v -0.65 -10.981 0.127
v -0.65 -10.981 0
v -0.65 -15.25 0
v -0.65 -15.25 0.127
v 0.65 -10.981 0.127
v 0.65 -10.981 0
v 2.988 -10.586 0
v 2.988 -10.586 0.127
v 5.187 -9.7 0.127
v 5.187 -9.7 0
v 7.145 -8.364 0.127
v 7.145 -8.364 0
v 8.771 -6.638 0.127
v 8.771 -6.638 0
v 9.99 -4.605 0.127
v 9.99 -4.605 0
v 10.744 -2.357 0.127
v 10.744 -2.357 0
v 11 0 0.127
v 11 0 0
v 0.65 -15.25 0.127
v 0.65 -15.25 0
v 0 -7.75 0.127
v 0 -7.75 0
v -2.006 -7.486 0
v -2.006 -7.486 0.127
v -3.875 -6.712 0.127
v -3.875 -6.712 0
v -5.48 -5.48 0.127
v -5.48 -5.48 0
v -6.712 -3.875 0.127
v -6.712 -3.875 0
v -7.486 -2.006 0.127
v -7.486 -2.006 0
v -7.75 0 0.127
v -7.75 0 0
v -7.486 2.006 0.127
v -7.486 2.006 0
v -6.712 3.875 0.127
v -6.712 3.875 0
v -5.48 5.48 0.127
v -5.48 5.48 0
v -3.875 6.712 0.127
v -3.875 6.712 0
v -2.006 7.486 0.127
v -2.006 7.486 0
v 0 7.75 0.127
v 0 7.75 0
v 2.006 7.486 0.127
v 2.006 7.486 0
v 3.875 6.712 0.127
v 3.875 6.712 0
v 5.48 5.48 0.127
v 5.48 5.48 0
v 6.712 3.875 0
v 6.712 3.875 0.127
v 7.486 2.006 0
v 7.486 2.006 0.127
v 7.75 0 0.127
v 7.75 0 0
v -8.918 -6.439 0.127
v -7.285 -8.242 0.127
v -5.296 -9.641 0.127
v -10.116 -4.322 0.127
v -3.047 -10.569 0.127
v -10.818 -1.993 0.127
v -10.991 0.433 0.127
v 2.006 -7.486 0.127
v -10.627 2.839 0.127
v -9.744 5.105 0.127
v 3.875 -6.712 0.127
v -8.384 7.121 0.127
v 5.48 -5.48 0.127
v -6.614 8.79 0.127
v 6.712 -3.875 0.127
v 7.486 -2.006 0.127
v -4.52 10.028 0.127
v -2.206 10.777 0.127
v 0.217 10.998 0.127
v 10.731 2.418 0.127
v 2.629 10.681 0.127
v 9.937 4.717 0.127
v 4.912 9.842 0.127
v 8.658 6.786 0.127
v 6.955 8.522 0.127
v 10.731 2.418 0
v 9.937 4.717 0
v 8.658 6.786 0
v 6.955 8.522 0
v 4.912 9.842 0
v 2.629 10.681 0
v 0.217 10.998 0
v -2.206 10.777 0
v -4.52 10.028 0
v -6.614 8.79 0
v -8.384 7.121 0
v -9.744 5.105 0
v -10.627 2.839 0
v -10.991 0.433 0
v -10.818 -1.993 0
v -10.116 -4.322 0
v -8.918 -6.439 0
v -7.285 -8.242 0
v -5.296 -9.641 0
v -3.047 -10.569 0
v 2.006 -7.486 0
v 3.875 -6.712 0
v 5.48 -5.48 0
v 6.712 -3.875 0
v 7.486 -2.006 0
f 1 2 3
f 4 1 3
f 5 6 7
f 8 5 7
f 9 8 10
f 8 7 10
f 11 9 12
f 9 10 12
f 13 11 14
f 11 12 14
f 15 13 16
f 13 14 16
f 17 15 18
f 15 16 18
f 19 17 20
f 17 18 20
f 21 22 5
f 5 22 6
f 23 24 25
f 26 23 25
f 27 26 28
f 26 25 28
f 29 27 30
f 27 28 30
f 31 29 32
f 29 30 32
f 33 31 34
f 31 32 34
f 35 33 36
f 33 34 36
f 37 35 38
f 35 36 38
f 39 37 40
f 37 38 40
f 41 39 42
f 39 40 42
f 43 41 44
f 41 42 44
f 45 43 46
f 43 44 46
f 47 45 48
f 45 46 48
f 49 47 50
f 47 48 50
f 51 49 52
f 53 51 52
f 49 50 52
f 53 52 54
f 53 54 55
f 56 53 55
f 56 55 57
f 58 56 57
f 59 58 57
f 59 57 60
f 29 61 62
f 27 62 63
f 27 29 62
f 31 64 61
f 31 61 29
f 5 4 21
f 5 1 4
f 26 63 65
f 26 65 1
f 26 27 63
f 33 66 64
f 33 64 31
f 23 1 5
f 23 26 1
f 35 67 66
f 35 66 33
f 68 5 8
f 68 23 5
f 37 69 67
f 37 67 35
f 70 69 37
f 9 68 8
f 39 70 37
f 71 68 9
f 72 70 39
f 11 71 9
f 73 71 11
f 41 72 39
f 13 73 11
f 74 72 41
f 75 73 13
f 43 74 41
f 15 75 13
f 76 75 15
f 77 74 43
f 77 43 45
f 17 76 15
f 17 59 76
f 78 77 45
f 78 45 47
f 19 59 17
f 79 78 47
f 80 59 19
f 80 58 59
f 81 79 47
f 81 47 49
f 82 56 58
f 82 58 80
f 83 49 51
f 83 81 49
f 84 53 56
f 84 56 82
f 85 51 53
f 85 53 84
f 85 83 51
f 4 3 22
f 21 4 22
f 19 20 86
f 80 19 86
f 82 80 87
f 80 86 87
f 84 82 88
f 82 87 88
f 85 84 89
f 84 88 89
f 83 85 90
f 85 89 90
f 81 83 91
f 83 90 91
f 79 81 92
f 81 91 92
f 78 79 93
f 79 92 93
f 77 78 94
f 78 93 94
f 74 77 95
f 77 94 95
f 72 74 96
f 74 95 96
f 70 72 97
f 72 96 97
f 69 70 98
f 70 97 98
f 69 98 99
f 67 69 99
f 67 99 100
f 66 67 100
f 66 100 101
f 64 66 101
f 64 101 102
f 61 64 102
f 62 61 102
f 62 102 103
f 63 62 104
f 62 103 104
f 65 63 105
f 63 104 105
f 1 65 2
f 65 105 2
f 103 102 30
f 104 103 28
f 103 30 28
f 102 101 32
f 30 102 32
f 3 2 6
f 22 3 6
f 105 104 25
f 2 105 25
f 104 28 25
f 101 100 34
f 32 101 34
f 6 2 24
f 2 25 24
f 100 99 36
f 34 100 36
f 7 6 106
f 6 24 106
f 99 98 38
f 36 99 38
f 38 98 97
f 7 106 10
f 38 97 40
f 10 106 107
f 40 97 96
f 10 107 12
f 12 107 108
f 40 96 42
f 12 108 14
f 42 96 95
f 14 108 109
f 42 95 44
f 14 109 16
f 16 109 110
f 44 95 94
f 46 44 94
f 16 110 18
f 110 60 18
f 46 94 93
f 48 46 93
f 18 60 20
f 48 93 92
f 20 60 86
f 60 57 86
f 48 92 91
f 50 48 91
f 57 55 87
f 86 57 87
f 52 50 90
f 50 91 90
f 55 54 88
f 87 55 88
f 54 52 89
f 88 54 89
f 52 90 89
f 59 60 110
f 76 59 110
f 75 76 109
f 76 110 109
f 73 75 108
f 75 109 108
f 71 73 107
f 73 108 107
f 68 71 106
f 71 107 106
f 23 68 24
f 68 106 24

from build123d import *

# Parameters (mm, degrees)
BOSS_EXTRUDE1_DEPTH = 0.127


with BuildPart() as part:
    # Sketch1 → Boss-Extrude1 (new body)
    # profile 1 of 5: a face of its own
    with BuildSketch(Plane.XY):
        with BuildLine():
            Line((-0.65, -7.75), (0, -7.75))
            Line((0, -7.75), (0.65, -7.75))
            Line((0.65, -7.75), (0.65, -10.980778661))
            ThreePointArc((0.65, -10.980778661), (8.004686128, -7.544865804), (11, 0))
            ThreePointArc((11, 0), (-7.544865804, 8.004686128), (-0.65, -10.980778661))
            Line((-0.65, -10.980778661), (-0.65, -7.75))
        make_face()
        with BuildLine():
            ThreePointArc((7.75, 0), (5.480077554, -5.480077554), (0, -7.75))
            ThreePointArc((0, -7.75), (-5.480077554, 5.480077554), (7.75, 0))
        make_face(mode=Mode.SUBTRACT)
    # profile 2 of 5: a face of its own
    with BuildSketch(Plane.XY):
        with BuildLine():
            Line((0.65, -7.75), (0, -7.75))
            Line((0, -7.75), (0, -11))
            ThreePointArc((0, -11), (0.325142069, -10.995193615), (0.65, -10.980778661))
            Line((0.65, -10.980778661), (0.65, -7.75))
        make_face()
    # profile 3 of 5: a face of its own
    with BuildSketch(Plane.XY):
        with BuildLine():
            Line((0, -11), (0, -7.75))
            Line((0, -7.75), (-0.65, -7.75))
            Line((-0.65, -7.75), (-0.65, -10.980778661))
            ThreePointArc((-0.65, -10.980778661), (-0.325142069, -10.995193615), (0, -11))
        make_face()
    # profile 4 of 5: a face of its own
    with BuildSketch(Plane.XY):
        with BuildLine():
            Line((0, -15.25), (0, -11))
            ThreePointArc((0, -11), (-0.325142069, -10.995193615), (-0.65, -10.980778661))
            Line((-0.65, -10.980778661), (-0.65, -15.25))
            Line((-0.65, -15.25), (0, -15.25))
        make_face()
    # profile 5 of 5: a face of its own
    with BuildSketch(Plane.XY):
        with BuildLine():
            ThreePointArc((0.65, -10.980778661), (0.325142069, -10.995193615), (0, -11))
            Line((0, -11), (0, -15.25))
            Line((0, -15.25), (0.65, -15.25))
            Line((0.65, -15.25), (0.65, -10.980778661))
        make_face()
    extrude(amount=BOSS_EXTRUDE1_DEPTH)


solid = part.part
